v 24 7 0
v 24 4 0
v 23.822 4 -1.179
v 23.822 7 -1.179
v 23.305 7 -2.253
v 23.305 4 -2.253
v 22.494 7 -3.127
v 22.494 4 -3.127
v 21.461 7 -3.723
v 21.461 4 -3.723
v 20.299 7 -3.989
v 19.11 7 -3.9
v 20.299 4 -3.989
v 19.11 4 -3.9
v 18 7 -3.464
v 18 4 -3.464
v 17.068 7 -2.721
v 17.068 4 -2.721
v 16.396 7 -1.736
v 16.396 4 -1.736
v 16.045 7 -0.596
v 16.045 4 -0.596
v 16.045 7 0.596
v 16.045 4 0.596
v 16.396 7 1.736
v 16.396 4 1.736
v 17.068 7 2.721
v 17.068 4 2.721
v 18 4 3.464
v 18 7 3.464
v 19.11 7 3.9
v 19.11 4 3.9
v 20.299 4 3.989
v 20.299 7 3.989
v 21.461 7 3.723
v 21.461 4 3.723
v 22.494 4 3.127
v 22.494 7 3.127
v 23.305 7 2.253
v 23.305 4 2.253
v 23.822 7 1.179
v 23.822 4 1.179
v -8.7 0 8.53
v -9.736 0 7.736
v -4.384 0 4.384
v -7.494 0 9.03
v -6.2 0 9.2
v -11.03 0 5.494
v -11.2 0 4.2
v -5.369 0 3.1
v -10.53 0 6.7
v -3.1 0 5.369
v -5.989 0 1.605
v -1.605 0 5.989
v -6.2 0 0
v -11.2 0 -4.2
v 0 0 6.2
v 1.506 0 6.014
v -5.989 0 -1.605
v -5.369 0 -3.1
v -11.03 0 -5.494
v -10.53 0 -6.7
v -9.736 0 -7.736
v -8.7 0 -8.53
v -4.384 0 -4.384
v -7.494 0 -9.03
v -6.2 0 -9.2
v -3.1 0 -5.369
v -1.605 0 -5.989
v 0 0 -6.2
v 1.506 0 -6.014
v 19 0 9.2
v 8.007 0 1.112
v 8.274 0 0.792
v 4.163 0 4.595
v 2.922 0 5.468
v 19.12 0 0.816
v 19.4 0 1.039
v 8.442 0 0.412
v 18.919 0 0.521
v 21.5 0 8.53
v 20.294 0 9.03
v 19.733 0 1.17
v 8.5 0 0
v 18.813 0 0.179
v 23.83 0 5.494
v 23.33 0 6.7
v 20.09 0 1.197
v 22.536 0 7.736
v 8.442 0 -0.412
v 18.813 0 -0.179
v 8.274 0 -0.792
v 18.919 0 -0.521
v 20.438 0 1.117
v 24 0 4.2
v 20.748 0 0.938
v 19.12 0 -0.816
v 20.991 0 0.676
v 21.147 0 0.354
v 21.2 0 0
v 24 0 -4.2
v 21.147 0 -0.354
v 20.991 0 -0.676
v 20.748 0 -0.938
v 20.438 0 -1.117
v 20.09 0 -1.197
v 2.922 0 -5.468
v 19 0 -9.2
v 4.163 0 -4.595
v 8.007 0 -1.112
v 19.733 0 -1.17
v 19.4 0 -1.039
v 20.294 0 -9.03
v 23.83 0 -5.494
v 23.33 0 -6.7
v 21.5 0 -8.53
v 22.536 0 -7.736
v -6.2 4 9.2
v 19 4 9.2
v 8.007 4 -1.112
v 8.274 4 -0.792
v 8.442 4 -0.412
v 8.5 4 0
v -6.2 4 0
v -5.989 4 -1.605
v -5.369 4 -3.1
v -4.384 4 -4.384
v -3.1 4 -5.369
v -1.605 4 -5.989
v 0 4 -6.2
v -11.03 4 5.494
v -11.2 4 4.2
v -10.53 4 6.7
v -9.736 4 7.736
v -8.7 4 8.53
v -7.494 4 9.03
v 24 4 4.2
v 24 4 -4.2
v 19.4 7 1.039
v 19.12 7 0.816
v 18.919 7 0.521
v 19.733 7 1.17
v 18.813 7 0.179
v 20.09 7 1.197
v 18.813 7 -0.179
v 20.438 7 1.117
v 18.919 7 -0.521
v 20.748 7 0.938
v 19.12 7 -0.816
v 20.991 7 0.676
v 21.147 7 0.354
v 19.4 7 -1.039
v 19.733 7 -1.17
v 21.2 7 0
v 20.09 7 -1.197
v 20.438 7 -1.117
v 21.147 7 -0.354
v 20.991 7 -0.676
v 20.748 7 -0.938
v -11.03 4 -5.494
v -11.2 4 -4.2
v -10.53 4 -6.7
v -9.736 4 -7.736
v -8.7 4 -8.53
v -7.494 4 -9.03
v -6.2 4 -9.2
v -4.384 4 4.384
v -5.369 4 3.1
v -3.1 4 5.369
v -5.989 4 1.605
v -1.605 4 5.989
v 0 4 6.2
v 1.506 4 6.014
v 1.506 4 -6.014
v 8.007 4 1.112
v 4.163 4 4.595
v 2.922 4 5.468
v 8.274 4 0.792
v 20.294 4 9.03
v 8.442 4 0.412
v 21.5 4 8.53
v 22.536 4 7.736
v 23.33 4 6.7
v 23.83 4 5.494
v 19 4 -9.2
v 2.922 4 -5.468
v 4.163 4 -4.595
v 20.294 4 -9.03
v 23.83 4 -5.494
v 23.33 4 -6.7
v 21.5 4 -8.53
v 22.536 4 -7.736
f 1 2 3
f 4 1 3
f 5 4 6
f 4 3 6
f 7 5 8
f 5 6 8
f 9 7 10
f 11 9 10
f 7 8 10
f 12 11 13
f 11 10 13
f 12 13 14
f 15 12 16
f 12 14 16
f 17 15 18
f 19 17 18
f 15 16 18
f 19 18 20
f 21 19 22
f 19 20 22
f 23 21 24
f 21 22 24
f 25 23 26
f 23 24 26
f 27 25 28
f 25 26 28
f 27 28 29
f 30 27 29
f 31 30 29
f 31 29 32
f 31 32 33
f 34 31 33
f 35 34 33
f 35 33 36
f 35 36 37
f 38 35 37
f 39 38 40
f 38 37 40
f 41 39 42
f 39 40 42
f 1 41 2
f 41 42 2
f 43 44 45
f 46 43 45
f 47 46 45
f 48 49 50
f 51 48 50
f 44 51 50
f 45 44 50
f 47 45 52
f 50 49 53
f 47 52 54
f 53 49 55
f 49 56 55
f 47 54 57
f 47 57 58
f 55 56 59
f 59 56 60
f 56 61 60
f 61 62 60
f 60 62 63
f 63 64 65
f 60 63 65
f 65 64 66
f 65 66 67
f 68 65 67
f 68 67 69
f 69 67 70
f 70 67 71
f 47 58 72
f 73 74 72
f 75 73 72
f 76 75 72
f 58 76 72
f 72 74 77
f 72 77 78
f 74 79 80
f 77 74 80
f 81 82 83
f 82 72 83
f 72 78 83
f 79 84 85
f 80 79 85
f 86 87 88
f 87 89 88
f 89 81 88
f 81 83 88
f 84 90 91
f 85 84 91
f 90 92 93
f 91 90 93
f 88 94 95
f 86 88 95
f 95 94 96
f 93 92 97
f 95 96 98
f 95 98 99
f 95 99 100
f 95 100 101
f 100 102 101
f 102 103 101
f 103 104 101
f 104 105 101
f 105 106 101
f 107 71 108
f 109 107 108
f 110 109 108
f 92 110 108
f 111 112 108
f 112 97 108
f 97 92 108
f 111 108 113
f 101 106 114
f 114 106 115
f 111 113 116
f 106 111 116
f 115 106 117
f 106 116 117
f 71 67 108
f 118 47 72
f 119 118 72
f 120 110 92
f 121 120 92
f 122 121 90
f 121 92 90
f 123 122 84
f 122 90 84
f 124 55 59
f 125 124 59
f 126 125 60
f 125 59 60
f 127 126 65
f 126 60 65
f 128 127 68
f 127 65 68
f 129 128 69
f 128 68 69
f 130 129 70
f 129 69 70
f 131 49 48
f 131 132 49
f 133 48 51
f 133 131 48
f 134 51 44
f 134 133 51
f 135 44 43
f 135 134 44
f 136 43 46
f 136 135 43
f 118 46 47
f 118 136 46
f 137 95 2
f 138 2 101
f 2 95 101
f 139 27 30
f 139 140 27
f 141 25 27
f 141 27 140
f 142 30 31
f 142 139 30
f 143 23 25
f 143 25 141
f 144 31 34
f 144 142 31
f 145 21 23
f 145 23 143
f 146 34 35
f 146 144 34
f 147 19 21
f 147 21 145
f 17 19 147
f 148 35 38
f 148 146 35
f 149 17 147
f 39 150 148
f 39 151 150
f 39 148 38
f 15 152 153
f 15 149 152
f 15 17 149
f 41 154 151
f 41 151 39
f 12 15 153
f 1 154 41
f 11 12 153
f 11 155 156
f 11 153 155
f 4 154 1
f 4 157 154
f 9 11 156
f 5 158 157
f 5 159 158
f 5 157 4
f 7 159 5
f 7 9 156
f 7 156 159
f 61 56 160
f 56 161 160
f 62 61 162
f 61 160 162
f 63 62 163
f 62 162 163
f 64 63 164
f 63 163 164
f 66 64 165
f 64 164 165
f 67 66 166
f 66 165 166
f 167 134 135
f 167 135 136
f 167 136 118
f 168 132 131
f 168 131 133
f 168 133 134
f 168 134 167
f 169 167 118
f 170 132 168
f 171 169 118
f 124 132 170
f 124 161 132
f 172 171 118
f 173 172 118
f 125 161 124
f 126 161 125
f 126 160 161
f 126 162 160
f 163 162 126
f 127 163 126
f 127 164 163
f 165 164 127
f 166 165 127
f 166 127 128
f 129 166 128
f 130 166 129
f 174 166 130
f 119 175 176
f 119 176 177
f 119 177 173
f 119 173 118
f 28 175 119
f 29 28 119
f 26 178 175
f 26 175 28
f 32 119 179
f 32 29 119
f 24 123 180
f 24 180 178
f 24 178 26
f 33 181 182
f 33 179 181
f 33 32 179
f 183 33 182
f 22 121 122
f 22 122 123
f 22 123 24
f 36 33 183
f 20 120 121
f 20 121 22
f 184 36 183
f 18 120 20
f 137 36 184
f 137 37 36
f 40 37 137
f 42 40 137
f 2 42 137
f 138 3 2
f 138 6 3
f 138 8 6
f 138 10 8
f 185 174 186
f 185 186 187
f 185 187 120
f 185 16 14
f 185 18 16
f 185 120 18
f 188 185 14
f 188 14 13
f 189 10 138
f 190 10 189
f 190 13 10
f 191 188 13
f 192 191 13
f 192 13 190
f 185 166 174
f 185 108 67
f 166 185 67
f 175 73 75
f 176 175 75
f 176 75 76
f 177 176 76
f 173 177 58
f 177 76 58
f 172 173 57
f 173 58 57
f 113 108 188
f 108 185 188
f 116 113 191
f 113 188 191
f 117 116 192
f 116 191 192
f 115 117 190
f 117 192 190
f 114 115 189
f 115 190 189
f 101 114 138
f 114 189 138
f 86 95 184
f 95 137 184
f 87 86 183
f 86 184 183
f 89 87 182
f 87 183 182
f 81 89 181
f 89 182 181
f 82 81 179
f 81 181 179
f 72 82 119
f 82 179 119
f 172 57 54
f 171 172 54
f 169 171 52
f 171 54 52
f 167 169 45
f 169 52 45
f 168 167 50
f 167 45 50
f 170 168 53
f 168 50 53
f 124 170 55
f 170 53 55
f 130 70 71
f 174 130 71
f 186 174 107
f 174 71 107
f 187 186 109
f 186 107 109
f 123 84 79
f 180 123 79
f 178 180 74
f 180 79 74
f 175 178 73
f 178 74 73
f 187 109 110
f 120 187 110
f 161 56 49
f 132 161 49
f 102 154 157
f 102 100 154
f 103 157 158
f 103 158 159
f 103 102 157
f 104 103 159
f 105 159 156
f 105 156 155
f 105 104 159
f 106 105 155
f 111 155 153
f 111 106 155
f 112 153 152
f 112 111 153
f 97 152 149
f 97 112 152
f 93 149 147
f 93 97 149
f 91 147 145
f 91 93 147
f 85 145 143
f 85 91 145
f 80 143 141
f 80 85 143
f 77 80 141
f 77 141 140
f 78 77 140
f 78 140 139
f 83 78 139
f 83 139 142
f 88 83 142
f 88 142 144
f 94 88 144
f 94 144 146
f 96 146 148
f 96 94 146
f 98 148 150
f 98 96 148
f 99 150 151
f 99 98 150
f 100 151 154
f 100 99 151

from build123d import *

# Parameters (mm, degrees)
SKETCH_1_W      = 5
SKETCH_1_H      = 12.4
SKETCH_1_R      = 1.2
EXTRUDE_1_DEPTH = 4
SKETCH_2_R      = 4
SKETCH_2_R_2    = 1.2
EXTRUDE_2_DEPTH = 3
FILLET_1_R      = 5


with BuildPart() as part:
    # Эскиз1 → Бобышка-Вытянуть1 (new body)
    with BuildSketch(Plane(origin=(0, 0, 0), x_dir=(1, 0, 0), z_dir=(0, 1, 0))):
        Polygon((-11.2, 6.2), (-6.2, 6.2), (0, 6.2), (16.4, 6.2), (21.4, 6.2), (21.4, -6.2), (16.4, -6.2), (6e-09, -6.2), (-6.2, -6.2), (-11.2, -6.2), (-11.2, -9.2), (24, -9.2), (24, 9.2), (-11.2, 9.2), align=None)
        Polygon((-6.2, 0), (-6.2, 6.2), (-11.2, 6.2), (-11.2, -6.2), (-6.2, -6.2), align=None)
        with Locations((18.9, 0)):
            Rectangle(SKETCH_1_W, SKETCH_1_H)
        with Locations((20, 0)):
            Circle(SKETCH_1_R, mode=Mode.SUBTRACT)
        with BuildLine():
            Line((16.4, 6.2), (0, 6.2))
            ThreePointArc((0, 6.2), (2.230840311, 5.784751637), (4.162857143, 4.594629518))
            Line((4.162857143, 4.594629518), (8.007142857, 1.111603916))
            ThreePointArc((8.007142857, 1.111603916), (8.37126115, 0.607982613), (8.5, 0))
            ThreePointArc((8.5, 0), (8.37126115, -0.607982613), (8.007142857, -1.111603916))
            Line((8.007142857, -1.111603916), (4.162857143, -4.594629518))
            ThreePointArc((4.162857143, -4.594629518), (2.230840314, -5.784751636), (6e-09, -6.2))
            Line((6e-09, -6.2), (16.4, -6.2))
            Line((16.4, -6.2), (16.4, 6.2))
        make_face()
        with BuildLine():
            Line((0, 6.2), (-6.2, 6.2))
            Line((-6.2, 6.2), (-6.2, 0))
            ThreePointArc((-6.2, 0), (-4.384062043, 4.384062043), (0, 6.2))
        make_face()
        with BuildLine():
            ThreePointArc((6e-09, -6.2), (-4.384062041, -4.384062046), (-6.2, 0))
            Line((-6.2, 0), (-6.2, -6.2))
            Line((-6.2, -6.2), (6e-09, -6.2))
        make_face()
    extrude(amount=EXTRUDE_1_DEPTH)

    # Эскиз2 → Бобышка-Вытянуть2 (add)
    with BuildSketch(Plane(origin=(0, 4, 0), x_dir=(1, 0, 0), z_dir=(0, 1, 0))):
        with Locations((20, 0)):
            Circle(SKETCH_2_R)
        with Locations((20, 0)):
            Circle(SKETCH_2_R_2, mode=Mode.SUBTRACT)
    extrude(amount=EXTRUDE_2_DEPTH)

    # Скругление1
    fillet_1_edges = [part.edges().sort_by_distance(p)[0] for p in [
        (24, 2, 9.2),
        (-11.2, 2, 9.2),
        (-11.2, 2, -9.2),
        (24, 2, -9.2),
    ]]
    fillet(fillet_1_edges, radius=FILLET_1_R)


solid = part.part
